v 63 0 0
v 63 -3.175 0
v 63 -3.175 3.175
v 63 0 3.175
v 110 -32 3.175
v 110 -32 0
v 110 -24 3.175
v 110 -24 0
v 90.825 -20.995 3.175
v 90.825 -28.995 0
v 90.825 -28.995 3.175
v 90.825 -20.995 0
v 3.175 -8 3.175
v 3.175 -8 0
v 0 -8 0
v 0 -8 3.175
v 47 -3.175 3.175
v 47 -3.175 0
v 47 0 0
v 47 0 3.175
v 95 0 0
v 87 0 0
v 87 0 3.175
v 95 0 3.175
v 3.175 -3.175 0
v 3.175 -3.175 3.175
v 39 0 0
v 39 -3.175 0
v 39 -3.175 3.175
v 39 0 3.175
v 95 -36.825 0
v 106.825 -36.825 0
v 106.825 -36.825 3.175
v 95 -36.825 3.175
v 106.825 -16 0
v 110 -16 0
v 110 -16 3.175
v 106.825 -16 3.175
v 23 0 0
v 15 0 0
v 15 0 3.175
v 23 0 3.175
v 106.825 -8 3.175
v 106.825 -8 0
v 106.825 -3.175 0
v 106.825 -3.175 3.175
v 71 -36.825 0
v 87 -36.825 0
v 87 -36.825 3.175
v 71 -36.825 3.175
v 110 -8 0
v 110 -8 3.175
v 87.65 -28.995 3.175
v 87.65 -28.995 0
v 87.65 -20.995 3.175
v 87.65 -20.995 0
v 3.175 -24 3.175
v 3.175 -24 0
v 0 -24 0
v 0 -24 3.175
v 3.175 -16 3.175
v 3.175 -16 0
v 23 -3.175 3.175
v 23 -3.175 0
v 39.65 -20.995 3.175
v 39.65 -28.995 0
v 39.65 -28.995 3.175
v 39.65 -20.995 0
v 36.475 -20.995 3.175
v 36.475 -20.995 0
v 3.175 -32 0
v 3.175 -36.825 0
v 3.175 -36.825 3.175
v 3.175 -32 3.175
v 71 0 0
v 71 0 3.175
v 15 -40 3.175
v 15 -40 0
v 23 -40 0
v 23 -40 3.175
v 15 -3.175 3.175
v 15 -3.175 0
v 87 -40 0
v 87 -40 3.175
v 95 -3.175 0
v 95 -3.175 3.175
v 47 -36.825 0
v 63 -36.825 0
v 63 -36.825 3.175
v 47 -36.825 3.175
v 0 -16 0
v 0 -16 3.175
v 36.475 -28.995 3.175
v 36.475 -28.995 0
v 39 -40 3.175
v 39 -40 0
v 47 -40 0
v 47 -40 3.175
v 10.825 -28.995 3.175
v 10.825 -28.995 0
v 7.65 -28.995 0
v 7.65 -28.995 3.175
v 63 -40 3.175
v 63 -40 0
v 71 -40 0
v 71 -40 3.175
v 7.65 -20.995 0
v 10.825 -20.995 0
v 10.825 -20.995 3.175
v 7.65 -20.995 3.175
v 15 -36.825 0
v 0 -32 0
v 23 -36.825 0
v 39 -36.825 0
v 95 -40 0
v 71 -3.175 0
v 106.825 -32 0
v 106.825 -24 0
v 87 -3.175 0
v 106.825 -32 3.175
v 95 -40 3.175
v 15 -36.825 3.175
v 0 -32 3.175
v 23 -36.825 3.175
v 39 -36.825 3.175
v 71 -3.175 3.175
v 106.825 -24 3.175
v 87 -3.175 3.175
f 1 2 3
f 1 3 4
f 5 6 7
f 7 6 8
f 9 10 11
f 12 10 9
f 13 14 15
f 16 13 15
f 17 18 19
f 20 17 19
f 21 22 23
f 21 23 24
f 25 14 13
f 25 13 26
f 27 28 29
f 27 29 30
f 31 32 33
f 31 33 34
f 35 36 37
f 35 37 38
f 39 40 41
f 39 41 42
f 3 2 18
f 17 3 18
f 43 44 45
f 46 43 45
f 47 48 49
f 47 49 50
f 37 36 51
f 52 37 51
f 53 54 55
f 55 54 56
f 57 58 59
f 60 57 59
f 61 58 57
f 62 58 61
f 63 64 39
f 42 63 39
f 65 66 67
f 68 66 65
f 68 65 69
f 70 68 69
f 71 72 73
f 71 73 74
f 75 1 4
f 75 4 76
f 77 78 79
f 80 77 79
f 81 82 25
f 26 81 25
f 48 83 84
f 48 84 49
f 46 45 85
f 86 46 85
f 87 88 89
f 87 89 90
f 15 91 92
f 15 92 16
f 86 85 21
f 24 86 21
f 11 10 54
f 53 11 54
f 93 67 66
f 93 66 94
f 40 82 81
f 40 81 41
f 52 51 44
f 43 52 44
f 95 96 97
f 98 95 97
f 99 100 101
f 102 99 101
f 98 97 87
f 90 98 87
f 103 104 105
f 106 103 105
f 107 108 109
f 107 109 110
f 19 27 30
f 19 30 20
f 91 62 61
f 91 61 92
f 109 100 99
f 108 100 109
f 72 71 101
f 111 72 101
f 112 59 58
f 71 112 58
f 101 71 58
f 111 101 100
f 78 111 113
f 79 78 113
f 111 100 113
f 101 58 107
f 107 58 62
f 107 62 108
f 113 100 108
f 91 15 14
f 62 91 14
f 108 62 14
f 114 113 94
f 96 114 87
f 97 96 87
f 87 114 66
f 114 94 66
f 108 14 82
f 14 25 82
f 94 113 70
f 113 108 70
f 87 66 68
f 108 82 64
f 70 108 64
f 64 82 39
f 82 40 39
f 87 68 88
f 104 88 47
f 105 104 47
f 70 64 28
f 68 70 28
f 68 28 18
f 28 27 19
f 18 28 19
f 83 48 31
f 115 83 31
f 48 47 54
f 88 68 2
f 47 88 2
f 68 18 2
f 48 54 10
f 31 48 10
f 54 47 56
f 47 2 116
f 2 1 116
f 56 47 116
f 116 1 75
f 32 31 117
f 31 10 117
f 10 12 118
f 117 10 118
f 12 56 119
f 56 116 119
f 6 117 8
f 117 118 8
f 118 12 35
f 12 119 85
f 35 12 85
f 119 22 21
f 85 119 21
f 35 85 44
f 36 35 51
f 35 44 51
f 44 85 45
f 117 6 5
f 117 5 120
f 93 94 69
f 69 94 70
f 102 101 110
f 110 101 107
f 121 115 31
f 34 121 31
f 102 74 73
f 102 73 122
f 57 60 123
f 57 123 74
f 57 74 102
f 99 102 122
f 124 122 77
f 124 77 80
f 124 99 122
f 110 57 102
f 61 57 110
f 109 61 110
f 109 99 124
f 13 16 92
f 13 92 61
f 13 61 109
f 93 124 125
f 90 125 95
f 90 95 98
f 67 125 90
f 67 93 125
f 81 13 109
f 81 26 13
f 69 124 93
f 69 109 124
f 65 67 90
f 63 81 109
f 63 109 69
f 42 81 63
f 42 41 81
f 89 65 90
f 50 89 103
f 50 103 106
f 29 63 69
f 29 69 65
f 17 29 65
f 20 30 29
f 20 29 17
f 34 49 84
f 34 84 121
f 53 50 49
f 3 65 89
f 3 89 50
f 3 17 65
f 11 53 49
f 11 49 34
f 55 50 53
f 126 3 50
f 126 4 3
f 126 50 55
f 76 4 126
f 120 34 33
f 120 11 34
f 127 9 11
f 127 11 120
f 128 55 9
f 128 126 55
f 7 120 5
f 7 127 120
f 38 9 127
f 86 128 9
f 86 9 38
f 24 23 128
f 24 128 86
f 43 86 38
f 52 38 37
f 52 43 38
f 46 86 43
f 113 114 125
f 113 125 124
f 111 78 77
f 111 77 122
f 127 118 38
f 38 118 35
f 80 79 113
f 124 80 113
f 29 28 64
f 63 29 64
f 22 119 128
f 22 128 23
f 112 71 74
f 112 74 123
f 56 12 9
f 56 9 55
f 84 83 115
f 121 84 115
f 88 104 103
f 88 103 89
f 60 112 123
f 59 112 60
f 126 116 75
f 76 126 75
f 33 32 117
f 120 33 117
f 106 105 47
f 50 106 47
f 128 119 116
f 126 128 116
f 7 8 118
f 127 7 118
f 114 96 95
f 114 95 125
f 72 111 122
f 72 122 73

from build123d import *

# Parameters (mm, degrees)
SKETCH1_W           = 110
SKETCH1_H           = 40
BOSS_EXTRUDE1_DEPTH = 3.175
CUT_EXTRUDE5_REACH  = 5.175
SKETCH6_W           = 15
SKETCH6_H           = 3.175
SKETCH6_W_2         = 16
CUT_EXTRUDE6_REACH  = 5.175
SKETCH7_W           = 3.175
SKETCH7_H           = 4.825
SKETCH7_H_2         = 8
CUT_EXTRUDE7_REACH  = 5.175
SKETCH8_W           = 3.175
SKETCH8_H           = 8


with BuildPart() as part:
    # Sketch1 → Boss-Extrude1 (new body)
    with BuildSketch(Plane.XY):
        with Locations((55, -20)):
            Rectangle(SKETCH1_W, SKETCH1_H)
    extrude(amount=BOSS_EXTRUDE1_DEPTH)

    # Sketch6 → Cut-Extrude5 (cut, up to next)
    with BuildSketch(Plane(origin=(0, 0, 0), x_dir=(-1, 0, 0), z_dir=(0, 0, -1)), mode=Mode.PRIVATE) as cut_extrude5_sk1:
        with Locations((-102.5, -38.4125)):
            Rectangle(SKETCH6_W, SKETCH6_H)
    cut_extrude5_tool1 = extrude(cut_extrude5_sk1.sketch, amount=-CUT_EXTRUDE5_REACH, mode=Mode.PRIVATE) & part.part
    add(cut_extrude5_tool1.solids().sort_by_distance((102.5, -38.4125, 0))[0], mode=Mode.SUBTRACT)
    # Sketch6 → Cut-Extrude5 (cut, up to next)
    with BuildSketch(Plane(origin=(0, 0, 0), x_dir=(-1, 0, 0), z_dir=(0, 0, -1)), mode=Mode.PRIVATE) as cut_extrude5_sk2:
        with Locations((-55, -38.4125)):
            Rectangle(SKETCH6_W_2, SKETCH6_H)
    cut_extrude5_tool2 = extrude(cut_extrude5_sk2.sketch, amount=-CUT_EXTRUDE5_REACH, mode=Mode.PRIVATE) & part.part
    add(cut_extrude5_tool2.solids().sort_by_distance((55, -38.4125, 0))[0], mode=Mode.SUBTRACT)
    # Sketch6 → Cut-Extrude5 (cut, up to next)
    with BuildSketch(Plane(origin=(0, 0, 0), x_dir=(-1, 0, 0), z_dir=(0, 0, -1)), mode=Mode.PRIVATE) as cut_extrude5_sk3:
        with Locations((-31, -38.4125)):
            Rectangle(SKETCH6_W_2, SKETCH6_H)
    cut_extrude5_tool3 = extrude(cut_extrude5_sk3.sketch, amount=-CUT_EXTRUDE5_REACH, mode=Mode.PRIVATE) & part.part
    add(cut_extrude5_tool3.solids().sort_by_distance((31, -38.4125, 0))[0], mode=Mode.SUBTRACT)
    # Sketch6 → Cut-Extrude5 (cut, up to next)
    with BuildSketch(Plane(origin=(0, 0, 0), x_dir=(-1, 0, 0), z_dir=(0, 0, -1)), mode=Mode.PRIVATE) as cut_extrude5_sk4:
        with Locations((-7.5, -38.4125)):
            Rectangle(SKETCH6_W, SKETCH6_H)
    cut_extrude5_tool4 = extrude(cut_extrude5_sk4.sketch, amount=-CUT_EXTRUDE5_REACH, mode=Mode.PRIVATE) & part.part
    add(cut_extrude5_tool4.solids().sort_by_distance((7.5, -38.4125, 0))[0], mode=Mode.SUBTRACT)
    # Sketch6 → Cut-Extrude5 (cut, up to next)
    with BuildSketch(Plane(origin=(0, 0, 0), x_dir=(-1, 0, 0), z_dir=(0, 0, -1)), mode=Mode.PRIVATE) as cut_extrude5_sk5:
        with Locations((-79, -38.4125)):
            Rectangle(SKETCH6_W_2, SKETCH6_H)
    cut_extrude5_tool5 = extrude(cut_extrude5_sk5.sketch, amount=-CUT_EXTRUDE5_REACH, mode=Mode.PRIVATE) & part.part
    add(cut_extrude5_tool5.solids().sort_by_distance((79, -38.4125, 0))[0], mode=Mode.SUBTRACT)
    # Sketch6 → Cut-Extrude5 (cut, up to next)
    with BuildSketch(Plane(origin=(0, 0, 0), x_dir=(-1, 0, 0), z_dir=(0, 0, -1)), mode=Mode.PRIVATE) as cut_extrude5_sk6:
        with Locations((-55, -1.5875)):
            Rectangle(SKETCH6_W_2, SKETCH6_H)
    cut_extrude5_tool6 = extrude(cut_extrude5_sk6.sketch, amount=-CUT_EXTRUDE5_REACH, mode=Mode.PRIVATE) & part.part
    add(cut_extrude5_tool6.solids().sort_by_distance((55, -1.5875, 0))[0], mode=Mode.SUBTRACT)
    # Sketch6 → Cut-Extrude5 (cut, up to next)
    with BuildSketch(Plane(origin=(0, 0, 0), x_dir=(-1, 0, 0), z_dir=(0, 0, -1)), mode=Mode.PRIVATE) as cut_extrude5_sk7:
        with Locations((-79, -1.5875)):
            Rectangle(SKETCH6_W_2, SKETCH6_H)
    cut_extrude5_tool7 = extrude(cut_extrude5_sk7.sketch, amount=-CUT_EXTRUDE5_REACH, mode=Mode.PRIVATE) & part.part
    add(cut_extrude5_tool7.solids().sort_by_distance((79, -1.5875, 0))[0], mode=Mode.SUBTRACT)
    # Sketch6 → Cut-Extrude5 (cut, up to next)
    with BuildSketch(Plane(origin=(0, 0, 0), x_dir=(-1, 0, 0), z_dir=(0, 0, -1)), mode=Mode.PRIVATE) as cut_extrude5_sk8:
        with Locations((-102.5, -1.5875)):
            Rectangle(SKETCH6_W, SKETCH6_H)
    cut_extrude5_tool8 = extrude(cut_extrude5_sk8.sketch, amount=-CUT_EXTRUDE5_REACH, mode=Mode.PRIVATE) & part.part
    add(cut_extrude5_tool8.solids().sort_by_distance((102.5, -1.5875, 0))[0], mode=Mode.SUBTRACT)
    # Sketch6 → Cut-Extrude5 (cut, up to next)
    with BuildSketch(Plane(origin=(0, 0, 0), x_dir=(-1, 0, 0), z_dir=(0, 0, -1)), mode=Mode.PRIVATE) as cut_extrude5_sk9:
        with Locations((-7.5, -1.5875)):
            Rectangle(SKETCH6_W, SKETCH6_H)
    cut_extrude5_tool9 = extrude(cut_extrude5_sk9.sketch, amount=-CUT_EXTRUDE5_REACH, mode=Mode.PRIVATE) & part.part
    add(cut_extrude5_tool9.solids().sort_by_distance((7.5, -1.5875, 0))[0], mode=Mode.SUBTRACT)
    # Sketch6 → Cut-Extrude5 (cut, up to next)
    with BuildSketch(Plane(origin=(0, 0, 0), x_dir=(-1, 0, 0), z_dir=(0, 0, -1)), mode=Mode.PRIVATE) as cut_extrude5_sk10:
        with Locations((-31, -1.5875)):
            Rectangle(SKETCH6_W_2, SKETCH6_H)
    cut_extrude5_tool10 = extrude(cut_extrude5_sk10.sketch, amount=-CUT_EXTRUDE5_REACH, mode=Mode.PRIVATE) & part.part
    add(cut_extrude5_tool10.solids().sort_by_distance((31, -1.5875, 0))[0], mode=Mode.SUBTRACT)

    # Sketch7 → Cut-Extrude6 (cut, up to next)
    with BuildSketch(Plane(origin=(0, 0, 0), x_dir=(-1, 0, 0), z_dir=(0, 0, -1)), mode=Mode.PRIVATE) as cut_extrude6_sk1:
        with Locations((-108.4125, -34.4125)):
            Rectangle(SKETCH7_W, SKETCH7_H)
    cut_extrude6_tool1 = extrude(cut_extrude6_sk1.sketch, amount=-CUT_EXTRUDE6_REACH, mode=Mode.PRIVATE) & part.part
    add(cut_extrude6_tool1.solids().sort_by_distance((108.4125, -34.4125, 0))[0], mode=Mode.SUBTRACT)
    # Sketch7 → Cut-Extrude6 (cut, up to next)
    with BuildSketch(Plane(origin=(0, 0, 0), x_dir=(-1, 0, 0), z_dir=(0, 0, -1)), mode=Mode.PRIVATE) as cut_extrude6_sk2:
        with Locations((-108.4125, -20)):
            Rectangle(SKETCH7_W, SKETCH7_H_2)
    cut_extrude6_tool2 = extrude(cut_extrude6_sk2.sketch, amount=-CUT_EXTRUDE6_REACH, mode=Mode.PRIVATE) & part.part
    add(cut_extrude6_tool2.solids().sort_by_distance((108.4125, -20, 0))[0], mode=Mode.SUBTRACT)
    # Sketch7 → Cut-Extrude6 (cut, up to next)
    with BuildSketch(Plane(origin=(0, 0, 0), x_dir=(-1, 0, 0), z_dir=(0, 0, -1)), mode=Mode.PRIVATE) as cut_extrude6_sk3:
        with Locations((-108.4125, -5.5875)):
            Rectangle(SKETCH7_W, SKETCH7_H)
    cut_extrude6_tool3 = extrude(cut_extrude6_sk3.sketch, amount=-CUT_EXTRUDE6_REACH, mode=Mode.PRIVATE) & part.part
    add(cut_extrude6_tool3.solids().sort_by_distance((108.4125, -5.5875, 0))[0], mode=Mode.SUBTRACT)
    # Sketch7 → Cut-Extrude6 (cut, up to next)
    with BuildSketch(Plane(origin=(0, 0, 0), x_dir=(-1, 0, 0), z_dir=(0, 0, -1)), mode=Mode.PRIVATE) as cut_extrude6_sk4:
        with Locations((-1.5875, -20)):
            Rectangle(SKETCH7_W, SKETCH7_H_2)
    cut_extrude6_tool4 = extrude(cut_extrude6_sk4.sketch, amount=-CUT_EXTRUDE6_REACH, mode=Mode.PRIVATE) & part.part
    add(cut_extrude6_tool4.solids().sort_by_distance((1.5875, -20, 0))[0], mode=Mode.SUBTRACT)
    # Sketch7 → Cut-Extrude6 (cut, up to next)
    with BuildSketch(Plane(origin=(0, 0, 0), x_dir=(-1, 0, 0), z_dir=(0, 0, -1)), mode=Mode.PRIVATE) as cut_extrude6_sk5:
        with Locations((-1.5875, -34.4125)):
            Rectangle(SKETCH7_W, SKETCH7_H)
    cut_extrude6_tool5 = extrude(cut_extrude6_sk5.sketch, amount=-CUT_EXTRUDE6_REACH, mode=Mode.PRIVATE) & part.part
    add(cut_extrude6_tool5.solids().sort_by_distance((1.5875, -34.4125, 0))[0], mode=Mode.SUBTRACT)
    # Sketch7 → Cut-Extrude6 (cut, up to next)
    with BuildSketch(Plane(origin=(0, 0, 0), x_dir=(-1, 0, 0), z_dir=(0, 0, -1)), mode=Mode.PRIVATE) as cut_extrude6_sk6:
        with Locations((-1.5875, -5.5875)):
            Rectangle(SKETCH7_W, SKETCH7_H)
    cut_extrude6_tool6 = extrude(cut_extrude6_sk6.sketch, amount=-CUT_EXTRUDE6_REACH, mode=Mode.PRIVATE) & part.part
    add(cut_extrude6_tool6.solids().sort_by_distance((1.5875, -5.5875, 0))[0], mode=Mode.SUBTRACT)

    # Sketch8 → Cut-Extrude7 (cut, up to next)
    with BuildSketch(Plane(origin=(0, 0, 0), x_dir=(-1, 0, 0), z_dir=(0, 0, -1)), mode=Mode.PRIVATE) as cut_extrude7_sk1:
        with Locations((-38.0625, -24.995)):
            Rectangle(SKETCH8_W, SKETCH8_H)
    cut_extrude7_tool1 = extrude(cut_extrude7_sk1.sketch, amount=-CUT_EXTRUDE7_REACH, mode=Mode.PRIVATE) & part.part
    add(cut_extrude7_tool1.solids().sort_by_distance((38.0625, -24.995, 0))[0], mode=Mode.SUBTRACT)
    # Sketch8 → Cut-Extrude7 (cut, up to next)
    with BuildSketch(Plane(origin=(0, 0, 0), x_dir=(-1, 0, 0), z_dir=(0, 0, -1)), mode=Mode.PRIVATE) as cut_extrude7_sk2:
        with Locations((-89.2375, -24.995)):
            Rectangle(SKETCH8_W, SKETCH8_H)
    cut_extrude7_tool2 = extrude(cut_extrude7_sk2.sketch, amount=-CUT_EXTRUDE7_REACH, mode=Mode.PRIVATE) & part.part
    add(cut_extrude7_tool2.solids().sort_by_distance((89.2375, -24.995, 0))[0], mode=Mode.SUBTRACT)
    # Sketch8 → Cut-Extrude7 (cut, up to next)
    with BuildSketch(Plane(origin=(0, 0, 0), x_dir=(-1, 0, 0), z_dir=(0, 0, -1)), mode=Mode.PRIVATE) as cut_extrude7_sk3:
        with Locations((-9.2375, -24.995)):
            Rectangle(SKETCH8_W, SKETCH8_H)
    cut_extrude7_tool3 = extrude(cut_extrude7_sk3.sketch, amount=-CUT_EXTRUDE7_REACH, mode=Mode.PRIVATE) & part.part
    add(cut_extrude7_tool3.solids().sort_by_distance((9.2375, -24.995, 0))[0], mode=Mode.SUBTRACT)


solid = part.part
